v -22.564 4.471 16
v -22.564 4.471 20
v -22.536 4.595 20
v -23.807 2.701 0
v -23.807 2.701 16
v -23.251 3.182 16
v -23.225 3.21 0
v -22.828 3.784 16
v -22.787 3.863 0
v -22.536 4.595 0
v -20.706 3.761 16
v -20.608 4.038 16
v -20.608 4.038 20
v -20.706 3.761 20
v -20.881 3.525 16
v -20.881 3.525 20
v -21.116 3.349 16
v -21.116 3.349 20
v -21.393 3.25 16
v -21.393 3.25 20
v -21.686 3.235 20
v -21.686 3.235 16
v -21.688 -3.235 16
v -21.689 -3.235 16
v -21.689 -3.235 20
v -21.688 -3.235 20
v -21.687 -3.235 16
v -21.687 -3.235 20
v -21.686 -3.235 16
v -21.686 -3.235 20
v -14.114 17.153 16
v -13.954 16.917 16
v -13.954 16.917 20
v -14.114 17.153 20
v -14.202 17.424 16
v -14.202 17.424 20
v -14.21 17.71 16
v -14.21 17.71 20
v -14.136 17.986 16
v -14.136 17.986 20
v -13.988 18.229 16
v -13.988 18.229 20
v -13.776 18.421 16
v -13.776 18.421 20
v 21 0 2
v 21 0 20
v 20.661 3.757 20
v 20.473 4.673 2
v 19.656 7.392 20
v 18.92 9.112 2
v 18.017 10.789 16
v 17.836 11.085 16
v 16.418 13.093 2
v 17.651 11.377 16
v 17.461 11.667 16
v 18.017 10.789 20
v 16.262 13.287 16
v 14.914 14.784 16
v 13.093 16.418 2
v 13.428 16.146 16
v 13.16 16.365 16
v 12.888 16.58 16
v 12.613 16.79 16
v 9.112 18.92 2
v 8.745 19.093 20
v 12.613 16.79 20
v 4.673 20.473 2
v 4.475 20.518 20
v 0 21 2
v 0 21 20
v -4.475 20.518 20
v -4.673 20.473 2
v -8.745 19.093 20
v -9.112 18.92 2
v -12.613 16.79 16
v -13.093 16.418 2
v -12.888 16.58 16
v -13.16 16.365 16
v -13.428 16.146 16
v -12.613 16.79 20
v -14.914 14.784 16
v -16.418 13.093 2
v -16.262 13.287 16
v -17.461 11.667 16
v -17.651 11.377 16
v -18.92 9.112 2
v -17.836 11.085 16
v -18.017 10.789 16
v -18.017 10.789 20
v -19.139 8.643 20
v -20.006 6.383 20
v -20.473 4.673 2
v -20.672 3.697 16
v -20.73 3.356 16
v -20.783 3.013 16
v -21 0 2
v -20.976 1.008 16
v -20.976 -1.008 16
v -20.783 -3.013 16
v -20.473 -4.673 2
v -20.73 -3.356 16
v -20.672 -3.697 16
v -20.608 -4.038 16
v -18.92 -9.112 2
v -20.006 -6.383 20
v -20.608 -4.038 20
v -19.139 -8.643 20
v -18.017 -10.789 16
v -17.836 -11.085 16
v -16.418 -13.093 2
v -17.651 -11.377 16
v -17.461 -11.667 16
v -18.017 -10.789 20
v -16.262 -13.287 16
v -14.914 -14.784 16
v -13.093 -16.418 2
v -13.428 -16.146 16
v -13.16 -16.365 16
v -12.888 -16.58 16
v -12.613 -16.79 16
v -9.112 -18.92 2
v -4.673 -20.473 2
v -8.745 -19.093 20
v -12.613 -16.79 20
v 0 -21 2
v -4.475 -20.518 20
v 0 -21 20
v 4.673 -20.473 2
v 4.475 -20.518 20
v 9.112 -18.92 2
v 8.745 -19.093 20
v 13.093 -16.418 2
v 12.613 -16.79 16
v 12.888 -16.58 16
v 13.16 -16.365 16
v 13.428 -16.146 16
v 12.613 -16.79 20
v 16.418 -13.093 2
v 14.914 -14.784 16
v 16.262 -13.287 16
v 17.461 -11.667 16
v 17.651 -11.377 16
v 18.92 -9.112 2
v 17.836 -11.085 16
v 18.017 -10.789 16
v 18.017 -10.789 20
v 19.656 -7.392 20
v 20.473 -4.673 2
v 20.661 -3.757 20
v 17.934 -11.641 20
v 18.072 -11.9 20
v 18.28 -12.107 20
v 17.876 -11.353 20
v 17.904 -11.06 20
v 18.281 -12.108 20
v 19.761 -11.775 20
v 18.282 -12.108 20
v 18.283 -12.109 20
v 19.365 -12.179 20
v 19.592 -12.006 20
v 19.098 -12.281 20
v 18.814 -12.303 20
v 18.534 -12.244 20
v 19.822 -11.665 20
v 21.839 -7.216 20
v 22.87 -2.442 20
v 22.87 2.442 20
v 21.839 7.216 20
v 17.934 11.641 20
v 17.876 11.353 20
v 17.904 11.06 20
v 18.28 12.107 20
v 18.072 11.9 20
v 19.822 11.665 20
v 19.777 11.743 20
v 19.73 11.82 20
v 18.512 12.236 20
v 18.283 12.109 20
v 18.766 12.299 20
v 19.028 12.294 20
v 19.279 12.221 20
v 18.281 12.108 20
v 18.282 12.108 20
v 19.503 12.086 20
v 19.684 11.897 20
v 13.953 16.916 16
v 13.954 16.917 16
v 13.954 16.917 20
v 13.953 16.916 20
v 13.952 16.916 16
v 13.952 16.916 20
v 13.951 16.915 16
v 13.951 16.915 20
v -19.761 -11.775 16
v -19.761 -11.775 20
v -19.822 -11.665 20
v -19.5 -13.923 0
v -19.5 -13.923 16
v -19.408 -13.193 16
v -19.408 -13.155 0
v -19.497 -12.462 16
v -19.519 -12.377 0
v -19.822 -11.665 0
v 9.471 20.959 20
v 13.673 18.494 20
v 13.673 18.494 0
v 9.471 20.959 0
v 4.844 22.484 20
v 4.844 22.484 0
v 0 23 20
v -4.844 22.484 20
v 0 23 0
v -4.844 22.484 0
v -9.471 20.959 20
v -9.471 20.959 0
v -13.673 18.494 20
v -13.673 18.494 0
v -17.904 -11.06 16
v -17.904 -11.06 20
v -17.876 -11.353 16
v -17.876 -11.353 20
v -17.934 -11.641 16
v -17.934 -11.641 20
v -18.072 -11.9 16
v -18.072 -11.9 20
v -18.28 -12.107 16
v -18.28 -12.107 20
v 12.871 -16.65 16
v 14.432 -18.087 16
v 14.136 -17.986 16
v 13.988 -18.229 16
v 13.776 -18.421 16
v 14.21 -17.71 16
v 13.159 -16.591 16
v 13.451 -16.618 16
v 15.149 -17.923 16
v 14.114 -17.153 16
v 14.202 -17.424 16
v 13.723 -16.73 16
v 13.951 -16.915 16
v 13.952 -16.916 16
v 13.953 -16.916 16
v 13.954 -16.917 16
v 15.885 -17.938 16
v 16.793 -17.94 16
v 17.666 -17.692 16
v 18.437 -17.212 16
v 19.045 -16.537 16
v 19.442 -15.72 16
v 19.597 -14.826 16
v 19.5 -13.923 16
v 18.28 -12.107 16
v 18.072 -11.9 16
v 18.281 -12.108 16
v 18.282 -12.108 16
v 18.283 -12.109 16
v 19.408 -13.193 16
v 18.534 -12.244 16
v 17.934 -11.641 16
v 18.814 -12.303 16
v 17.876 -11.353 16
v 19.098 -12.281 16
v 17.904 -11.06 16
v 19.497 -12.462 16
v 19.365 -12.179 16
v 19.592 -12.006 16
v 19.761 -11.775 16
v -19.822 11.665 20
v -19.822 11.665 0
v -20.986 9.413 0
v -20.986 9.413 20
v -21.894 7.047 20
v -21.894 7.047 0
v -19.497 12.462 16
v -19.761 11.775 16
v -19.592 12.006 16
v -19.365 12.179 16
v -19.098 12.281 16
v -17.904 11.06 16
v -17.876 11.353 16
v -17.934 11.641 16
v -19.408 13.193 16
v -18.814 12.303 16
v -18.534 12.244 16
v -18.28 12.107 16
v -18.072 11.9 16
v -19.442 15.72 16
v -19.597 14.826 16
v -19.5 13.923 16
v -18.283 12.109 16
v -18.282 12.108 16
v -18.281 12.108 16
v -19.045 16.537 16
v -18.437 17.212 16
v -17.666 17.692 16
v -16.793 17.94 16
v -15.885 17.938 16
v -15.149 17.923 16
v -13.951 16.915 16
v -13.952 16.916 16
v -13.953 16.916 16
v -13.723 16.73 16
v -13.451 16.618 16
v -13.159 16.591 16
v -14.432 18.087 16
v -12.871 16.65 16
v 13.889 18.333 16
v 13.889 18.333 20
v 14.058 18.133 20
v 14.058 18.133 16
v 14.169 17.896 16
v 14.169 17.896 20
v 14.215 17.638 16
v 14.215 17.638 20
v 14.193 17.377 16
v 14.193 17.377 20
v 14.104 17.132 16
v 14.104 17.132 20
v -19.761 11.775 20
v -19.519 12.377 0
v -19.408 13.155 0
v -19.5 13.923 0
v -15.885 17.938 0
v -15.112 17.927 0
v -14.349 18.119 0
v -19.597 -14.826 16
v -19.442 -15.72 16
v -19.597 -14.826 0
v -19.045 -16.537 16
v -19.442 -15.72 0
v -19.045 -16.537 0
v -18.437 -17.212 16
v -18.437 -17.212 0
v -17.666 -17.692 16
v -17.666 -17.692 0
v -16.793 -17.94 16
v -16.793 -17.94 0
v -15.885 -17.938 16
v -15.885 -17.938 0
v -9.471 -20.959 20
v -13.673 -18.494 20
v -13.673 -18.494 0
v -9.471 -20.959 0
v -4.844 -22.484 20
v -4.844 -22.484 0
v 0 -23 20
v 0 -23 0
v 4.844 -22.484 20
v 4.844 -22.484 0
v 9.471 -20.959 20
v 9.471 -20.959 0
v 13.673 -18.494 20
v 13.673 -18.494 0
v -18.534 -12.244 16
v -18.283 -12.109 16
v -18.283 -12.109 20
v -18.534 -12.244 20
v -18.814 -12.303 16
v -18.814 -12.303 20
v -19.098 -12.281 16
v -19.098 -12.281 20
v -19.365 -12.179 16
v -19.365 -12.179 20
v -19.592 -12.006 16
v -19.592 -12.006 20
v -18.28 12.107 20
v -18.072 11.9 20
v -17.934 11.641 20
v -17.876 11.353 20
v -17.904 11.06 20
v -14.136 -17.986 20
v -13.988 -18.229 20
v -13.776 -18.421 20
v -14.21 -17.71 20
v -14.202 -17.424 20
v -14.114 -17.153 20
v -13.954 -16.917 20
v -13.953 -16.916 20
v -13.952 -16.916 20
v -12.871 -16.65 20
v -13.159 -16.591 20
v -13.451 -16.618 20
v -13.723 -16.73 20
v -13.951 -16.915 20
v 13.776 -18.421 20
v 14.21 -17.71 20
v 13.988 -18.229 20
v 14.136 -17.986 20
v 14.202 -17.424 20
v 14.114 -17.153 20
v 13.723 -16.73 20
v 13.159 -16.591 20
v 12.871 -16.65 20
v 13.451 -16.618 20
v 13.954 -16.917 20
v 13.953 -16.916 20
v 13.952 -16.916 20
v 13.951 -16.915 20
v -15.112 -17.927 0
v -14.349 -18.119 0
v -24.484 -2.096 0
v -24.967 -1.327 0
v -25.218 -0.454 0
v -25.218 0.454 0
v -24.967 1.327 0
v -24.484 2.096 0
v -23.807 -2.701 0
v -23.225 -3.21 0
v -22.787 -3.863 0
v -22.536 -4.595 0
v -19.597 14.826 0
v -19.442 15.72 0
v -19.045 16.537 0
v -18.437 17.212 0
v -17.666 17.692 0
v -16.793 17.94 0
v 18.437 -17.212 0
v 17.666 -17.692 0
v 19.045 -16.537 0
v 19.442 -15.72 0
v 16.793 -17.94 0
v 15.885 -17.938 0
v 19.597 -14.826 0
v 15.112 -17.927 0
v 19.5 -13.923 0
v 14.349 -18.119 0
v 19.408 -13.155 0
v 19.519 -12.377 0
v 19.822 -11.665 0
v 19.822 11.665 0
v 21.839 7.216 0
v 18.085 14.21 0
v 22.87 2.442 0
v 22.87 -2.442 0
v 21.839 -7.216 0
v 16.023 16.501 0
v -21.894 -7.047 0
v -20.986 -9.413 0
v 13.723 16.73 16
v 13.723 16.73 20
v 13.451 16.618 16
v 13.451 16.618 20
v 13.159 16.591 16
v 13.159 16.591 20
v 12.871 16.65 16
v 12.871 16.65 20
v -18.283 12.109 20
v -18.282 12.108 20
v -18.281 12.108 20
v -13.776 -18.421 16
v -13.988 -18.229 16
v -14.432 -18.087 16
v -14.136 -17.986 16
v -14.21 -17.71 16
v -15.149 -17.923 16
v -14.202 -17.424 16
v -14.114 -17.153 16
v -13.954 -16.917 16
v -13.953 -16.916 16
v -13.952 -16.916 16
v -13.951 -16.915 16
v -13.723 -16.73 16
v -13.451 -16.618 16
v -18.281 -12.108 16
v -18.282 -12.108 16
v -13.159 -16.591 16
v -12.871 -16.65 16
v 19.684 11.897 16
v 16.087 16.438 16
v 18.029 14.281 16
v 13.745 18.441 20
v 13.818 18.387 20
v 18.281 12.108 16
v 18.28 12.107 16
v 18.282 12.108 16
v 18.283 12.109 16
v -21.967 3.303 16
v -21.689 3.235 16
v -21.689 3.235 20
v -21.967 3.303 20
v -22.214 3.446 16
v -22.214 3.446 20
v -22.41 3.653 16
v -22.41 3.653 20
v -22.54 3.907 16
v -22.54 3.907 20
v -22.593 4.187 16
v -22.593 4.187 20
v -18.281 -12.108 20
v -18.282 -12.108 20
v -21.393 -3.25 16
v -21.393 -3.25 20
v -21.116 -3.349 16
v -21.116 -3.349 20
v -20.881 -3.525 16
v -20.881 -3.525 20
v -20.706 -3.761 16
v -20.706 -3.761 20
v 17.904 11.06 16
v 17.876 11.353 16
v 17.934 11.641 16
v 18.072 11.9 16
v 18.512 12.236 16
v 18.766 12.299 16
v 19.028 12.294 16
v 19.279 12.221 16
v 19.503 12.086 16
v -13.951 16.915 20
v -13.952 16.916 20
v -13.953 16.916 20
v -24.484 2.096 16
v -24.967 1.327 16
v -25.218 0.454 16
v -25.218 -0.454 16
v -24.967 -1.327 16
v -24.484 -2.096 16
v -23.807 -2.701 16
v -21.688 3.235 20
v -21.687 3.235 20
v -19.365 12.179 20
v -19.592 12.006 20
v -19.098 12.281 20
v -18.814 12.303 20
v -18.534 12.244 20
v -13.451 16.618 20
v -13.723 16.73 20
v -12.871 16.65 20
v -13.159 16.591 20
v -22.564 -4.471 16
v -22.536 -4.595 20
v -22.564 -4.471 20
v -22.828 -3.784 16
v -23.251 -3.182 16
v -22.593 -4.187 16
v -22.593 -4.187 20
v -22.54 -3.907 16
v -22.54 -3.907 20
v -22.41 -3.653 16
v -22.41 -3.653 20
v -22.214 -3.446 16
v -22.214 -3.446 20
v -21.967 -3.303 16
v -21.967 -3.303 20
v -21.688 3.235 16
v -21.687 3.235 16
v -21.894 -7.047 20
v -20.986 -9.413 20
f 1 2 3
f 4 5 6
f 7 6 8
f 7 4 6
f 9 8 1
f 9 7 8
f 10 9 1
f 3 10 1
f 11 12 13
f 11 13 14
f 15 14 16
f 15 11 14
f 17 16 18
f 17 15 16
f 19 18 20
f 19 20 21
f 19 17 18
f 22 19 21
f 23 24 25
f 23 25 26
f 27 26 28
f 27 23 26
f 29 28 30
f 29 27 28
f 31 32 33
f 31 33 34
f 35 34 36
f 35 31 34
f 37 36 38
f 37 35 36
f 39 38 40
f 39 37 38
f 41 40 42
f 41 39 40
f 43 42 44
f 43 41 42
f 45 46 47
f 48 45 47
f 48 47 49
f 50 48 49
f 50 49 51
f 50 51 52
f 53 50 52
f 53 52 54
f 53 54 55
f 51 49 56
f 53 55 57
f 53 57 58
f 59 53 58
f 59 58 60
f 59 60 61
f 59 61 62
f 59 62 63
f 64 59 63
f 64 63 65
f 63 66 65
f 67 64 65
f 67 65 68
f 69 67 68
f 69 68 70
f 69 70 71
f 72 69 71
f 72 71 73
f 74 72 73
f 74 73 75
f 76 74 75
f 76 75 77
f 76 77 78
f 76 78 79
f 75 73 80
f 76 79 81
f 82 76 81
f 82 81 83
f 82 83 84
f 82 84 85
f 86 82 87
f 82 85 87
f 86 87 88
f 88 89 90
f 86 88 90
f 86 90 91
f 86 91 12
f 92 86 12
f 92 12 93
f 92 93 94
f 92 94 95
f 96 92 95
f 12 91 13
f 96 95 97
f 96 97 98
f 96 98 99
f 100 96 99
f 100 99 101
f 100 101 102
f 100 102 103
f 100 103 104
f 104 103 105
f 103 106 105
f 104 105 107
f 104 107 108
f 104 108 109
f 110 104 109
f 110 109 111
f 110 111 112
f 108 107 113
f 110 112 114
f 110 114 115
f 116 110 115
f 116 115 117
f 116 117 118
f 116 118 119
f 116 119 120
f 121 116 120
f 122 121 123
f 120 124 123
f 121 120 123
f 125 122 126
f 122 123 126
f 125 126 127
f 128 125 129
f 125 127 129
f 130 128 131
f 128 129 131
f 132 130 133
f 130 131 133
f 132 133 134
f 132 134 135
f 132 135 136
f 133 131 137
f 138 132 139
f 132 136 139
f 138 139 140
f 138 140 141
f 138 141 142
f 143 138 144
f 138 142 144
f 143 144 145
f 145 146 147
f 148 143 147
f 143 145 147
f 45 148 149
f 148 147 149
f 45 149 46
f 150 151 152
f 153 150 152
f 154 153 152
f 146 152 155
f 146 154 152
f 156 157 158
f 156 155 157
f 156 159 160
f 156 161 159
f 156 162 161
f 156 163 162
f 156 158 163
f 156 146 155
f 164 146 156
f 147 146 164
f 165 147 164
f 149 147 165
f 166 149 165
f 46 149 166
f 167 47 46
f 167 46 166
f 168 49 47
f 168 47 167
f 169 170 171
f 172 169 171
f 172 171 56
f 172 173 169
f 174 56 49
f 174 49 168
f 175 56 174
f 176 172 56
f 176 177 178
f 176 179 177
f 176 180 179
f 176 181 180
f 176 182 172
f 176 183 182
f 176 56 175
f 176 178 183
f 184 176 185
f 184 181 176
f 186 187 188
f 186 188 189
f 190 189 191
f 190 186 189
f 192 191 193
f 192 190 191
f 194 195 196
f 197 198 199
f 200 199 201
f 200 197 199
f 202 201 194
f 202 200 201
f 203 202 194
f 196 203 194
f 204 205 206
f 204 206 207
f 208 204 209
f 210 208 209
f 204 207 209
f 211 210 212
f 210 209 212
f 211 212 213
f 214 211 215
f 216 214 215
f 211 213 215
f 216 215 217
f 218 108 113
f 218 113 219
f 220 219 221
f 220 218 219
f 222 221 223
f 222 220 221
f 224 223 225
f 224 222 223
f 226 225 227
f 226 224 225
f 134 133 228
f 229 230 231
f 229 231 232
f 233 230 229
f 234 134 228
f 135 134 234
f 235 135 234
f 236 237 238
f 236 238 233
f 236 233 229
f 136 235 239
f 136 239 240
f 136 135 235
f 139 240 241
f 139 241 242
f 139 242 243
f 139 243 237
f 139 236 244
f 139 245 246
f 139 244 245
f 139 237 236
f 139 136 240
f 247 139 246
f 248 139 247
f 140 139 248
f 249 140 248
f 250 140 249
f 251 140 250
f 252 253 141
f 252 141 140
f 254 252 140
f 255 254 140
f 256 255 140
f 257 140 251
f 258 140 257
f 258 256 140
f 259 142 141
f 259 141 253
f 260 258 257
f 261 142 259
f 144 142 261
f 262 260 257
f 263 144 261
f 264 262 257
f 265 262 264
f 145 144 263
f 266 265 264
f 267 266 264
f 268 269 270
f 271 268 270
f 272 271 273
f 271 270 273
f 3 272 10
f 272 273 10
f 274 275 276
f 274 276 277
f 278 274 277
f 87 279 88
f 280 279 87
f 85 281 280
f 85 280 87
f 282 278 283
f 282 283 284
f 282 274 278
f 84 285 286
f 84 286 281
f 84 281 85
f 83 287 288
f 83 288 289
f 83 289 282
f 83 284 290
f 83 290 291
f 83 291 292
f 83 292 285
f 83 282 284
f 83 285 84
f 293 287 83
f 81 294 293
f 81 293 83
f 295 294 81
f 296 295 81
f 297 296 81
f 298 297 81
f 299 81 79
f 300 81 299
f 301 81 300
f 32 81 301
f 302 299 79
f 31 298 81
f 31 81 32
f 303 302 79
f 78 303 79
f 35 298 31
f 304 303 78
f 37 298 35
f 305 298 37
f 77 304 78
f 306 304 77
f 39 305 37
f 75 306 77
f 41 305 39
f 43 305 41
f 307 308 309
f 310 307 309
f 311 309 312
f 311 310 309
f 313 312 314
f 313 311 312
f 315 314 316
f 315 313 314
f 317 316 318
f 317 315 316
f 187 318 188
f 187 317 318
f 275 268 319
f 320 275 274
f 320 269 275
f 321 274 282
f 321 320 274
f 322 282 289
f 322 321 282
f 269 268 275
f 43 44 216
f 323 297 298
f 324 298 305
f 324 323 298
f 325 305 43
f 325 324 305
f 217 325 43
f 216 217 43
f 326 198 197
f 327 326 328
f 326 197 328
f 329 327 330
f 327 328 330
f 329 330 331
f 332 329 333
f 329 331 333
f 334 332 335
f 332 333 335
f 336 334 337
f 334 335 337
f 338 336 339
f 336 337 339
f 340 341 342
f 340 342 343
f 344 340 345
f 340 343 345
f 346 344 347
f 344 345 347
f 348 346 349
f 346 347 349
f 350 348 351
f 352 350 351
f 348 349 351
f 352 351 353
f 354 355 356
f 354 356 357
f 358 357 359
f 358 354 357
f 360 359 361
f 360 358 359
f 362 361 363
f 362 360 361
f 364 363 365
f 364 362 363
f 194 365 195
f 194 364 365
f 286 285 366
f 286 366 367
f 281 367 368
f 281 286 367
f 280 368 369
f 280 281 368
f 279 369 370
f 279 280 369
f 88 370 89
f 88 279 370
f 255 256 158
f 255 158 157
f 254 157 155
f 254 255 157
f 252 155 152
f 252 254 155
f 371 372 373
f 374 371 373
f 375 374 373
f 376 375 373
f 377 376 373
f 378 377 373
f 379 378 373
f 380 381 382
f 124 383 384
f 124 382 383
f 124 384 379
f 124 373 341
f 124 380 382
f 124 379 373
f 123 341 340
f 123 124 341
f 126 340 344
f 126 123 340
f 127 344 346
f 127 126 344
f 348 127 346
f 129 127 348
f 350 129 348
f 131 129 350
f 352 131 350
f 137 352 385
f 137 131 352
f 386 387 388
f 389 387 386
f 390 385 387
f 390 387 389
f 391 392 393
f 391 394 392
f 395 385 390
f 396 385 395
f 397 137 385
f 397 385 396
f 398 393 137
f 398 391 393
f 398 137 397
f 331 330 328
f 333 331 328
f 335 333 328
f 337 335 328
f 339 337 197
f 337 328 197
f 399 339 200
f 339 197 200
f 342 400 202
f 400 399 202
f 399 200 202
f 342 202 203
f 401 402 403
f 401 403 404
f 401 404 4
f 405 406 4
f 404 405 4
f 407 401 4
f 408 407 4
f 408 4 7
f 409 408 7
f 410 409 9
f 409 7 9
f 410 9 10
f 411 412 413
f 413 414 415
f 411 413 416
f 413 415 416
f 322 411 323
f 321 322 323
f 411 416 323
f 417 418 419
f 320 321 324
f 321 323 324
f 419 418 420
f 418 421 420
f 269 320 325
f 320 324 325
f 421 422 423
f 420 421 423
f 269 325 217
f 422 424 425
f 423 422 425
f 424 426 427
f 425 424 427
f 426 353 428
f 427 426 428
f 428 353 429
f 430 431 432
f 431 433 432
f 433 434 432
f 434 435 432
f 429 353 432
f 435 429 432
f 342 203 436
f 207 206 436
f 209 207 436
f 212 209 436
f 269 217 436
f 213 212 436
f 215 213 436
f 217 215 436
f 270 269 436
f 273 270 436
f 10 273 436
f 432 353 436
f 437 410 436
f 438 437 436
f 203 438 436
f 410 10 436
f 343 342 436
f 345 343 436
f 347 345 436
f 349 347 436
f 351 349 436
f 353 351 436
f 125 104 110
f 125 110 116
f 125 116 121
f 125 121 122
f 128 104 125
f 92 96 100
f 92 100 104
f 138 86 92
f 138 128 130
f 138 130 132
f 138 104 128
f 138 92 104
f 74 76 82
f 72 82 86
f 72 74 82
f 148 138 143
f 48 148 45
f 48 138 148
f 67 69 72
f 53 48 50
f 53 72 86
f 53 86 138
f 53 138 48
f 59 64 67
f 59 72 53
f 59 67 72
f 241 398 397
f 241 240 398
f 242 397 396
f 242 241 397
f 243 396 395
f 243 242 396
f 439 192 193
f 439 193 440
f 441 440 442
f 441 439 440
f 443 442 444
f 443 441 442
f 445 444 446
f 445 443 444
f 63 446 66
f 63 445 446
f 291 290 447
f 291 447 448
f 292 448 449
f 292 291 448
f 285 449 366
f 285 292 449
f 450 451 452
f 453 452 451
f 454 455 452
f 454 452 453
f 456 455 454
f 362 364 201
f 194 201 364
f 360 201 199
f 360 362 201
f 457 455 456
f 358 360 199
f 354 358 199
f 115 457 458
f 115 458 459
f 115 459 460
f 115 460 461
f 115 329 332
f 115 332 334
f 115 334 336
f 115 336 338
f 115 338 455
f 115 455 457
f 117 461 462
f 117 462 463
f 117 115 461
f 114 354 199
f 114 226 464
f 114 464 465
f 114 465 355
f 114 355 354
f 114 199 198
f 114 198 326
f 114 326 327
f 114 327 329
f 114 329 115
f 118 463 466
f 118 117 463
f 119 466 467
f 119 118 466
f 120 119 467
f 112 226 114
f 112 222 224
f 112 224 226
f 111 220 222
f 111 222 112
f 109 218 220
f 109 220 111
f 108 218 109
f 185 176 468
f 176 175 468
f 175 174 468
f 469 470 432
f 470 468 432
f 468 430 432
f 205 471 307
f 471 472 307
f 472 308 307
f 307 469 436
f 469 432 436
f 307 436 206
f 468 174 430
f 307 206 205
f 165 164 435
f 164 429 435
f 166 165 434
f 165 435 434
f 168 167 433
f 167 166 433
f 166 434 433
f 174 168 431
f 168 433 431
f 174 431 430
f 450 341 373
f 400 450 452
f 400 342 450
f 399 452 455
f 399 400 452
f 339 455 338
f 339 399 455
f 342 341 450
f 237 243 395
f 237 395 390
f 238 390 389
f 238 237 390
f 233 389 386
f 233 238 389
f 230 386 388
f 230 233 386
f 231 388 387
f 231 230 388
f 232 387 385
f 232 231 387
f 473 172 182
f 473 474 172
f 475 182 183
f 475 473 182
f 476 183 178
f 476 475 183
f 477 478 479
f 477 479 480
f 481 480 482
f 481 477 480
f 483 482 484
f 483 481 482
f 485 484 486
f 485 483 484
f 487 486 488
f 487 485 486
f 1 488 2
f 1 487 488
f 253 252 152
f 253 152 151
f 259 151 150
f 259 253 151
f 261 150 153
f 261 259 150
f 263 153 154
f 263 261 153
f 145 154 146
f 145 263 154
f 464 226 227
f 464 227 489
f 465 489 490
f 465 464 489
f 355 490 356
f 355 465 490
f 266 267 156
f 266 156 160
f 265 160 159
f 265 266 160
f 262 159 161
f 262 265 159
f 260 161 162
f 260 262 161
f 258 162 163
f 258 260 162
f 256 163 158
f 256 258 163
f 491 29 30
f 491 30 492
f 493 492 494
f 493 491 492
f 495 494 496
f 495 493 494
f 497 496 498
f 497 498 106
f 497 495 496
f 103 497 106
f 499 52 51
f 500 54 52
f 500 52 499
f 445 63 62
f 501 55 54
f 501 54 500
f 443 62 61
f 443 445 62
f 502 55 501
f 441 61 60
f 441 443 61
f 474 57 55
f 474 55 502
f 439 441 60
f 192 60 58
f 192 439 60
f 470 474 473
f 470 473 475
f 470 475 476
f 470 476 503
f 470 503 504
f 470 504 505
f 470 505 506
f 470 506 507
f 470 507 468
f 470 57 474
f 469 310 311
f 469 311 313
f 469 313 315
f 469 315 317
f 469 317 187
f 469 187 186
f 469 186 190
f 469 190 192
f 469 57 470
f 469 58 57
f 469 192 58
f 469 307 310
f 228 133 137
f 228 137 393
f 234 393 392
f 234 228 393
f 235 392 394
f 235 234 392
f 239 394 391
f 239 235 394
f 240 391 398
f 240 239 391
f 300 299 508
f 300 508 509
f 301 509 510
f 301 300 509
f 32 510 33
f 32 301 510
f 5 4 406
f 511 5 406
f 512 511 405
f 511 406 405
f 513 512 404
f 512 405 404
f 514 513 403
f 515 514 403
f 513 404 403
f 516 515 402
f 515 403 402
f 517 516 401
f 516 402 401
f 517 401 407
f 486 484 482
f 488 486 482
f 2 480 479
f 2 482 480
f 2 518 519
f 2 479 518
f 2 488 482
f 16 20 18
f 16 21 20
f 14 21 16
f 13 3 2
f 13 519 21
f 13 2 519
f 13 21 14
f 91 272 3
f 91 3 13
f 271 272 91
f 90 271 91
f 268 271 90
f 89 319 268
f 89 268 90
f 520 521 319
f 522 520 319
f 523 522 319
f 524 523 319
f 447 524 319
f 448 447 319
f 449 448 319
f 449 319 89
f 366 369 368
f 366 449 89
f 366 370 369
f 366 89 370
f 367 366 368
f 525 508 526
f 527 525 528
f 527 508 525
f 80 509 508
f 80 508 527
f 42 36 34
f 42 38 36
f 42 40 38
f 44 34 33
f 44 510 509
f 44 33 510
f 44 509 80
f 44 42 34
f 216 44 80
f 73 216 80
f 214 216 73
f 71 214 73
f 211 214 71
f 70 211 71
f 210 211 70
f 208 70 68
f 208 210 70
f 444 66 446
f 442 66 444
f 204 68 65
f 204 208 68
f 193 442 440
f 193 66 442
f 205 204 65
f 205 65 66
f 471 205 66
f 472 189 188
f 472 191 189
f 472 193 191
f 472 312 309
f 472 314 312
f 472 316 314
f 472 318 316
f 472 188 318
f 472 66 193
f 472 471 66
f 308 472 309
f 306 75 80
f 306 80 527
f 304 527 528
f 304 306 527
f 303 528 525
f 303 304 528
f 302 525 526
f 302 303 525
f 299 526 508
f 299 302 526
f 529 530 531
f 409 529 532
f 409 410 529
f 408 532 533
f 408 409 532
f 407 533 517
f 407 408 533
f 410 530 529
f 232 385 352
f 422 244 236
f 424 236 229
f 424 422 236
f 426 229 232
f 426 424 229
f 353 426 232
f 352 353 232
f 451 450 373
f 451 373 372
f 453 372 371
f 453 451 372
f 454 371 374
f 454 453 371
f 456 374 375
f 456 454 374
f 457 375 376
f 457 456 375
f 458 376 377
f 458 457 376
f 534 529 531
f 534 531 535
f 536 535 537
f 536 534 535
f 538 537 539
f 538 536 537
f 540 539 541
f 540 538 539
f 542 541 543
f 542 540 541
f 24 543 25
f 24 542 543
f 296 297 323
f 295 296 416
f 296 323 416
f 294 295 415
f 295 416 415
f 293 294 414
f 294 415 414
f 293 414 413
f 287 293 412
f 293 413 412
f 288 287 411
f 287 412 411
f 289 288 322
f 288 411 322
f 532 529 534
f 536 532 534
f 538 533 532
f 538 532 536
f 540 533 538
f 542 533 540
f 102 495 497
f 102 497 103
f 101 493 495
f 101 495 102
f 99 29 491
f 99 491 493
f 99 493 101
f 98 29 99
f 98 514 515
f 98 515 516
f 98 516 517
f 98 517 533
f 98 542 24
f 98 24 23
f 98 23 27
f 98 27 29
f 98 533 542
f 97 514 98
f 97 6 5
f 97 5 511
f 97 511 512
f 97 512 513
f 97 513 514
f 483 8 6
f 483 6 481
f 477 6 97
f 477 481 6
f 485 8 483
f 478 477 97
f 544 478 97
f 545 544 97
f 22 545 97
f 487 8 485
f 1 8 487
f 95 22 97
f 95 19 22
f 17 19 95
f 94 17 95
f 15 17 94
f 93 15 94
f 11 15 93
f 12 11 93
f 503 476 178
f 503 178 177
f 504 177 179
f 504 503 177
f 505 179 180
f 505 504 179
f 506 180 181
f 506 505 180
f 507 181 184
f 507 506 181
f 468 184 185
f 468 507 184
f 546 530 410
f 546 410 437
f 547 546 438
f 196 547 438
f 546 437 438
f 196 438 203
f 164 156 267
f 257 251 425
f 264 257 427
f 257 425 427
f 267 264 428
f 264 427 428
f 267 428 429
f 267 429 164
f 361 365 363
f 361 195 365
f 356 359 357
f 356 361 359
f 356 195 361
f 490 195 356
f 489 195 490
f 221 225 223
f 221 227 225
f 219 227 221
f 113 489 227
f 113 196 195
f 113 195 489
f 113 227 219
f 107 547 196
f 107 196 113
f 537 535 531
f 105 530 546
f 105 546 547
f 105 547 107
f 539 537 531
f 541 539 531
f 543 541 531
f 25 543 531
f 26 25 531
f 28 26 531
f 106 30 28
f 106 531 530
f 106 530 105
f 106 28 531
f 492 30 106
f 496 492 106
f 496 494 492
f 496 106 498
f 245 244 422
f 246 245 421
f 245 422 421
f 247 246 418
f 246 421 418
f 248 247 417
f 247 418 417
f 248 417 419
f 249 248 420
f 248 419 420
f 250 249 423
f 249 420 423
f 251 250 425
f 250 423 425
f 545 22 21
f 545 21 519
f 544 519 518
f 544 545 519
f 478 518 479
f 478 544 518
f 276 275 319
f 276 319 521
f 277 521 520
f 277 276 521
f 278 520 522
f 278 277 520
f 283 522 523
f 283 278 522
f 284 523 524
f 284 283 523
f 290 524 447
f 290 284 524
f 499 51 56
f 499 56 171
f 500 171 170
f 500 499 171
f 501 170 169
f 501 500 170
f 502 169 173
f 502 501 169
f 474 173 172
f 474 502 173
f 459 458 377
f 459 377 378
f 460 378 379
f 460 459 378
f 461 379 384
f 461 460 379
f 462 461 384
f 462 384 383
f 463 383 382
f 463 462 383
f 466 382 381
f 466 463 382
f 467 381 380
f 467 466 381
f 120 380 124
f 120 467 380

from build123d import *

# Parameters (mm, degrees)
SKETCH_1_R          = 23
EXTRUDE_1_DEPTH     = 20
SKETCH_2_R          = 21
CUT_EXTRUDE_1_DEPTH = 18
EXTRUDE_START       = -20
EXTRUDE_2_DEPTH     = 20
FILLET_1_R          = 3
SKETCH_6_R          = 21
CUT_EXTRUDE_2_DEPTH = 18
CUT_EXTRUDE_START   = -4
SKETCH_7_R          = 3.25
CUT_EXTRUDE_3_DEPTH = 4
FILLET_START        = 16
FILLET_2_DEPTH      = 4
CUT_EXTRUDE_4_REACH = 41.58


with BuildPart() as part:
    # Эскиз1 → Бобышка-Вытянуть1 (new body)
    with BuildSketch(Plane.XY):
        Circle(SKETCH_1_R)
    extrude(amount=EXTRUDE_1_DEPTH)

    # Эскиз2 → Вырез-Вытянуть1 (cut)
    with BuildSketch(Plane.XY.offset(20)):
        Circle(SKETCH_2_R)
    extrude(amount=-CUT_EXTRUDE_1_DEPTH, mode=Mode.SUBTRACT)

    # Эскиз5 → Бобышка-Вытянуть2 (add)
    with BuildSketch(Plane.XY.offset(20).offset(EXTRUDE_START)):
        with BuildLine():
            ThreePointArc((-13.428172595, 16.145717103), (-18.764406843, 16.895547811), (-17.460895421, 11.666924663))
            ThreePointArc((-17.460895421, 11.666924663), (-19.605188956, 7.52572694), (-20.782670455, 3.013404848))
            ThreePointArc((-20.782670455, 3.013404848), (-25.25, 0), (-20.782670455, -3.013404848))
            ThreePointArc((-20.782670455, -3.013404848), (-19.605188956, -7.52572694), (-17.460895421, -11.666924663))
            ThreePointArc((-17.460895421, -11.666924663), (-18.764406843, -16.895547811), (-13.428172595, -16.145717103))
            ThreePointArc((-13.428172595, -16.145717103), (0, -21), (13.428172595, -16.145717103))
            ThreePointArc((13.428172595, -16.145717103), (18.764406843, -16.895547811), (17.460895421, -11.666924663))
            ThreePointArc((17.460895421, -11.666924663), (21, 0), (17.460895421, 11.666924663))
            ThreePointArc((17.460895421, 11.666924663), (18.764406843, 16.895547811), (13.428172595, 16.145717103))
            ThreePointArc((13.428172595, 16.145717103), (0, 21), (-13.428172595, 16.145717103))
        make_face()
    extrude(amount=EXTRUDE_2_DEPTH)

    # Скругление1
    fillet_1_edges = [part.edges().sort_by_distance(p)[0] for p in [
        (19.041496109, 12.900442858, 10),
        (14.820151209, -17.588721334, 10),
        (-19.041496109, -12.900442858, 10),
        (-22.782670455, 3.154350481, 10),
        (-14.820151209, 17.588721334, 10),
        (14.820151209, 17.588721334, 10),
        (19.041496109, -12.900442858, 10),
        (-14.820151209, -17.588721334, 10),
        (-22.782670455, -3.154350481, 10),
        (-19.041496109, 12.900442858, 10),
    ]]
    fillet(fillet_1_edges, radius=FILLET_1_R)

    # Эскиз6 → Вырез-Вытянуть2 (cut)
    with BuildSketch(Plane.XY.offset(20)):
        Circle(SKETCH_6_R)
    extrude(amount=-CUT_EXTRUDE_2_DEPTH, mode=Mode.SUBTRACT)

    # Эскиз7 → Вырез-Вытянуть3 (cut)
    with BuildSketch(Plane.XY.offset(20).offset(CUT_EXTRUDE_START)):
        with Locations((-16.349186161, 14.72087334)):
            Circle(SKETCH_7_R)
        with Locations((16.349186161, 14.72087334)):
            Circle(SKETCH_7_R)
        with Locations((-16.349186161, -14.72087334)):
            Circle(SKETCH_7_R)
        with Locations((-22, 0)):
            Circle(SKETCH_7_R)
        with Locations((16.349186161, -14.72087334)):
            Circle(SKETCH_7_R)
    extrude(amount=CUT_EXTRUDE_3_DEPTH, mode=Mode.SUBTRACT)

    # Скругление2: read off the stored shape, not the designer's step
    # Скругление2 outline → Скругление2 (cut)
    with BuildSketch(Plane.XY.offset(FILLET_START)):
        with BuildLine():
            ThreePointArc((-13.776491508, -18.421379011), (-14.209607213, -17.709819826), (-13.95357615, -16.917132131))
            ThreePointArc((-13.95357615, -16.917132131), (-14.831000199, -17.59447933), (-15.885025704, -17.937557202))
            ThreePointArc((-15.885025704, -17.937557202), (-14.785629767, -17.982793014), (-13.776491508, -18.421379011))
        make_face()
        with BuildLine():
            ThreePointArc((-19.499730713, -13.923020582), (-19.048356591, -12.910630542), (-18.283004183, -12.108815175))
            ThreePointArc((-18.283004183, -12.108815175), (-19.098111986, -12.280585247), (-19.760500256, -11.775464006))
            ThreePointArc((-19.760500256, -11.775464006), (-19.42980055, -12.824918821), (-19.499730713, -13.923020582))
        make_face()
        with BuildLine():
            ThreePointArc((-22.564236885, -4.471480374), (-22.409978551, -3.652877874), (-21.689298793, -3.235114335))
            ThreePointArc((-21.689298793, -3.235114335), (-22.794585678, -3.151370115), (-23.807443182, -2.701045935))
            ThreePointArc((-23.807443182, -2.701045935), (-23.020701446, -3.470302164), (-22.564236885, -4.471480374))
        make_face()
        with BuildLine():
            ThreePointArc((-23.807443182, 2.701045935), (-22.794585678, 3.151370115), (-21.689298793, 3.235114335))
            ThreePointArc((-21.689298793, 3.235114335), (-22.409978551, 3.652877874), (-22.564236885, 4.471480374))
            ThreePointArc((-22.564236885, 4.471480374), (-23.020701446, 3.470302164), (-23.807443182, 2.701045935))
        make_face()
        with BuildLine():
            ThreePointArc((-19.760500256, 11.775464006), (-19.098111986, 12.280585247), (-18.283004183, 12.108815175))
            ThreePointArc((-18.283004183, 12.108815175), (-19.048356591, 12.910630542), (-19.499730713, 13.923020582))
            ThreePointArc((-19.499730713, 13.923020582), (-19.42980055, 12.824918821), (-19.760500256, 11.775464006))
        make_face()
        with BuildLine():
            ThreePointArc((-15.885025704, 17.937557202), (-14.831000199, 17.59447933), (-13.95357615, 16.917132131))
            ThreePointArc((-13.95357615, 16.917132131), (-14.209607213, 17.709819826), (-13.776491508, 18.421379011))
            ThreePointArc((-13.776491508, 18.421379011), (-14.785629767, 17.982793014), (-15.885025704, 17.937557202))
        make_face()
        with BuildLine():
            ThreePointArc((13.776491508, 18.421379011), (14.209607213, 17.709819826), (13.95357615, 16.917132131))
            ThreePointArc((13.95357615, 16.917132131), (14.831000199, 17.59447933), (15.885025704, 17.937557202))
            ThreePointArc((15.885025704, 17.937557202), (14.785629767, 17.982793014), (13.776491508, 18.421379011))
        make_face()
        with BuildLine():
            ThreePointArc((19.499730713, 13.923020582), (19.048356591, 12.910630542), (18.283004183, 12.108815175))
            ThreePointArc((18.283004183, 12.108815175), (19.098111986, 12.280585247), (19.760500256, 11.775464006))
            ThreePointArc((19.760500256, 11.775464006), (19.42980055, 12.824918821), (19.499730713, 13.923020582))
        make_face()
        with BuildLine():
            ThreePointArc((19.760500256, -11.775464006), (19.098111986, -12.280585247), (18.283004183, -12.108815175))
            ThreePointArc((18.283004183, -12.108815175), (19.048356591, -12.910630542), (19.499730713, -13.923020582))
            ThreePointArc((19.499730713, -13.923020582), (19.42980055, -12.824918821), (19.760500256, -11.775464006))
        make_face()
        with BuildLine():
            ThreePointArc((15.885025704, -17.937557202), (14.831000199, -17.59447933), (13.95357615, -16.917132131))
            ThreePointArc((13.95357615, -16.917132131), (14.209607213, -17.709819826), (13.776491508, -18.421379011))
            ThreePointArc((13.776491508, -18.421379011), (14.785629767, -17.982793014), (15.885025704, -17.937557202))
        make_face()
        with BuildLine():
            ThreePointArc((-13.951391744, -16.914747069), (-13.306228642, -16.594083591), (-12.612990263, -16.790249451))
            ThreePointArc((-12.612990263, -16.790249451), (-13.024568946, -16.473026551), (-13.428172595, -16.145717103))
            ThreePointArc((-13.428172595, -16.145717103), (-13.662128037, -16.549046921), (-13.951391744, -16.914747069))
        make_face()
        with BuildLine():
            ThreePointArc((13.428172595, -16.145717103), (13.024568946, -16.473026551), (12.612990263, -16.790249451))
            ThreePointArc((12.612990263, -16.790249451), (13.306228642, -16.594083591), (13.951391744, -16.914747069))
            ThreePointArc((13.951391744, -16.914747069), (13.662128037, -16.549046921), (13.428172595, -16.145717103))
        make_face()
        with BuildLine():
            ThreePointArc((-18.280403854, -12.106892043), (-17.886470759, -11.857439027), (-17.460895421, -11.666924663))
            ThreePointArc((-17.460895421, -11.666924663), (-17.744223765, -11.231318844), (-18.016687197, -10.78883601))
            ThreePointArc((-18.016687197, -10.78883601), (-17.894059096, -11.498781672), (-18.280403854, -12.106892043))
        make_face()
        with BuildLine():
            ThreePointArc((18.016687197, -10.78883601), (17.744223765, -11.231318844), (17.460895421, -11.666924663))
            ThreePointArc((17.460895421, -11.666924663), (17.886470759, -11.857439027), (18.280403854, -12.106892043))
            ThreePointArc((18.280403854, -12.106892043), (17.894059096, -11.498781672), (18.016687197, -10.78883601))
        make_face()
        with BuildLine():
            ThreePointArc((-21.686079545, -3.234803541), (-20.992064177, -3.428202514), (-20.608148244, -4.037849175))
            ThreePointArc((-20.608148244, -4.037849175), (-20.701747261, -3.526706725), (-20.782670455, -3.013404848))
            ThreePointArc((-20.782670455, -3.013404848), (-21.226413556, -3.156590568), (-21.686079545, -3.234803541))
        make_face()
        with BuildLine():
            ThreePointArc((-21.686079545, 3.234803541), (-21.226413556, 3.156590568), (-20.782670455, 3.013404848))
            ThreePointArc((-20.782670455, 3.013404848), (-20.701747261, 3.526706725), (-20.608148244, 4.037849175))
            ThreePointArc((-20.608148244, 4.037849175), (-20.992064177, 3.428202514), (-21.686079545, 3.234803541))
        make_face()
        with BuildLine():
            ThreePointArc((17.460895421, 11.666924663), (17.744223765, 11.231318844), (18.016687197, 10.78883601))
            ThreePointArc((18.016687197, 10.78883601), (17.894059096, 11.498781672), (18.280403854, 12.106892043))
            ThreePointArc((18.280403854, 12.106892043), (17.886470759, 11.857439027), (17.460895421, 11.666924663))
        make_face()
        with BuildLine():
            ThreePointArc((-18.280403854, 12.106892043), (-17.894059096, 11.498781672), (-18.016687197, 10.78883601))
            ThreePointArc((-18.016687197, 10.78883601), (-17.744223765, 11.231318844), (-17.460895421, 11.666924663))
            ThreePointArc((-17.460895421, 11.666924663), (-17.886470759, 11.857439027), (-18.280403854, 12.106892043))
        make_face()
        with BuildLine():
            ThreePointArc((12.612990263, 16.790249451), (13.024568946, 16.473026551), (13.428172595, 16.145717103))
            ThreePointArc((13.428172595, 16.145717103), (13.662128037, 16.549046921), (13.951391744, 16.914747069))
            ThreePointArc((13.951391744, 16.914747069), (13.306228642, 16.594083591), (12.612990263, 16.790249451))
        make_face()
        with BuildLine():
            ThreePointArc((-13.951391744, 16.914747069), (-13.662128037, 16.549046921), (-13.428172595, 16.145717103))
            ThreePointArc((-13.428172595, 16.145717103), (-13.024568946, 16.473026551), (-12.612990263, 16.790249451))
            ThreePointArc((-12.612990263, 16.790249451), (-13.306228642, 16.594083591), (-13.951391744, 16.914747069))
        make_face()
    extrude(amount=FILLET_2_DEPTH, mode=Mode.SUBTRACT)

    # Эскиз8 → Вырез-Вытянуть4 (cut, up to next)
    with BuildSketch(Plane(origin=(0, 0, 0), x_dir=(-1, 0, 0), z_dir=(0, 0, -1)), mode=Mode.PRIVATE) as cut_extrude_4_sk1:
        with BuildLine():
            ThreePointArc((-15.885025704, 17.937557202), (-18.764406843, 16.895547811), (-19.499730713, 13.923020582))
            ThreePointArc((-19.499730713, 13.923020582), (-19.438094361, 12.762156961), (-19.822395798, 11.665017138))
            ThreePointArc((-19.822395798, 11.665017138), (-17.092330986, 15.390003946), (-13.673119525, 18.494480324))
            ThreePointArc((-13.673119525, 18.494480324), (-14.724078663, 17.997601791), (-15.885025704, 17.937557202))
        make_face()
    cut_extrude_4_tool1 = extrude(cut_extrude_4_sk1.sketch, amount=-CUT_EXTRUDE_4_REACH, mode=Mode.PRIVATE) & part.part
    add(cut_extrude_4_tool1.solids().sort_by_distance((17.719386, 15.954607, 0))[0], mode=Mode.SUBTRACT)


solid = part.part
